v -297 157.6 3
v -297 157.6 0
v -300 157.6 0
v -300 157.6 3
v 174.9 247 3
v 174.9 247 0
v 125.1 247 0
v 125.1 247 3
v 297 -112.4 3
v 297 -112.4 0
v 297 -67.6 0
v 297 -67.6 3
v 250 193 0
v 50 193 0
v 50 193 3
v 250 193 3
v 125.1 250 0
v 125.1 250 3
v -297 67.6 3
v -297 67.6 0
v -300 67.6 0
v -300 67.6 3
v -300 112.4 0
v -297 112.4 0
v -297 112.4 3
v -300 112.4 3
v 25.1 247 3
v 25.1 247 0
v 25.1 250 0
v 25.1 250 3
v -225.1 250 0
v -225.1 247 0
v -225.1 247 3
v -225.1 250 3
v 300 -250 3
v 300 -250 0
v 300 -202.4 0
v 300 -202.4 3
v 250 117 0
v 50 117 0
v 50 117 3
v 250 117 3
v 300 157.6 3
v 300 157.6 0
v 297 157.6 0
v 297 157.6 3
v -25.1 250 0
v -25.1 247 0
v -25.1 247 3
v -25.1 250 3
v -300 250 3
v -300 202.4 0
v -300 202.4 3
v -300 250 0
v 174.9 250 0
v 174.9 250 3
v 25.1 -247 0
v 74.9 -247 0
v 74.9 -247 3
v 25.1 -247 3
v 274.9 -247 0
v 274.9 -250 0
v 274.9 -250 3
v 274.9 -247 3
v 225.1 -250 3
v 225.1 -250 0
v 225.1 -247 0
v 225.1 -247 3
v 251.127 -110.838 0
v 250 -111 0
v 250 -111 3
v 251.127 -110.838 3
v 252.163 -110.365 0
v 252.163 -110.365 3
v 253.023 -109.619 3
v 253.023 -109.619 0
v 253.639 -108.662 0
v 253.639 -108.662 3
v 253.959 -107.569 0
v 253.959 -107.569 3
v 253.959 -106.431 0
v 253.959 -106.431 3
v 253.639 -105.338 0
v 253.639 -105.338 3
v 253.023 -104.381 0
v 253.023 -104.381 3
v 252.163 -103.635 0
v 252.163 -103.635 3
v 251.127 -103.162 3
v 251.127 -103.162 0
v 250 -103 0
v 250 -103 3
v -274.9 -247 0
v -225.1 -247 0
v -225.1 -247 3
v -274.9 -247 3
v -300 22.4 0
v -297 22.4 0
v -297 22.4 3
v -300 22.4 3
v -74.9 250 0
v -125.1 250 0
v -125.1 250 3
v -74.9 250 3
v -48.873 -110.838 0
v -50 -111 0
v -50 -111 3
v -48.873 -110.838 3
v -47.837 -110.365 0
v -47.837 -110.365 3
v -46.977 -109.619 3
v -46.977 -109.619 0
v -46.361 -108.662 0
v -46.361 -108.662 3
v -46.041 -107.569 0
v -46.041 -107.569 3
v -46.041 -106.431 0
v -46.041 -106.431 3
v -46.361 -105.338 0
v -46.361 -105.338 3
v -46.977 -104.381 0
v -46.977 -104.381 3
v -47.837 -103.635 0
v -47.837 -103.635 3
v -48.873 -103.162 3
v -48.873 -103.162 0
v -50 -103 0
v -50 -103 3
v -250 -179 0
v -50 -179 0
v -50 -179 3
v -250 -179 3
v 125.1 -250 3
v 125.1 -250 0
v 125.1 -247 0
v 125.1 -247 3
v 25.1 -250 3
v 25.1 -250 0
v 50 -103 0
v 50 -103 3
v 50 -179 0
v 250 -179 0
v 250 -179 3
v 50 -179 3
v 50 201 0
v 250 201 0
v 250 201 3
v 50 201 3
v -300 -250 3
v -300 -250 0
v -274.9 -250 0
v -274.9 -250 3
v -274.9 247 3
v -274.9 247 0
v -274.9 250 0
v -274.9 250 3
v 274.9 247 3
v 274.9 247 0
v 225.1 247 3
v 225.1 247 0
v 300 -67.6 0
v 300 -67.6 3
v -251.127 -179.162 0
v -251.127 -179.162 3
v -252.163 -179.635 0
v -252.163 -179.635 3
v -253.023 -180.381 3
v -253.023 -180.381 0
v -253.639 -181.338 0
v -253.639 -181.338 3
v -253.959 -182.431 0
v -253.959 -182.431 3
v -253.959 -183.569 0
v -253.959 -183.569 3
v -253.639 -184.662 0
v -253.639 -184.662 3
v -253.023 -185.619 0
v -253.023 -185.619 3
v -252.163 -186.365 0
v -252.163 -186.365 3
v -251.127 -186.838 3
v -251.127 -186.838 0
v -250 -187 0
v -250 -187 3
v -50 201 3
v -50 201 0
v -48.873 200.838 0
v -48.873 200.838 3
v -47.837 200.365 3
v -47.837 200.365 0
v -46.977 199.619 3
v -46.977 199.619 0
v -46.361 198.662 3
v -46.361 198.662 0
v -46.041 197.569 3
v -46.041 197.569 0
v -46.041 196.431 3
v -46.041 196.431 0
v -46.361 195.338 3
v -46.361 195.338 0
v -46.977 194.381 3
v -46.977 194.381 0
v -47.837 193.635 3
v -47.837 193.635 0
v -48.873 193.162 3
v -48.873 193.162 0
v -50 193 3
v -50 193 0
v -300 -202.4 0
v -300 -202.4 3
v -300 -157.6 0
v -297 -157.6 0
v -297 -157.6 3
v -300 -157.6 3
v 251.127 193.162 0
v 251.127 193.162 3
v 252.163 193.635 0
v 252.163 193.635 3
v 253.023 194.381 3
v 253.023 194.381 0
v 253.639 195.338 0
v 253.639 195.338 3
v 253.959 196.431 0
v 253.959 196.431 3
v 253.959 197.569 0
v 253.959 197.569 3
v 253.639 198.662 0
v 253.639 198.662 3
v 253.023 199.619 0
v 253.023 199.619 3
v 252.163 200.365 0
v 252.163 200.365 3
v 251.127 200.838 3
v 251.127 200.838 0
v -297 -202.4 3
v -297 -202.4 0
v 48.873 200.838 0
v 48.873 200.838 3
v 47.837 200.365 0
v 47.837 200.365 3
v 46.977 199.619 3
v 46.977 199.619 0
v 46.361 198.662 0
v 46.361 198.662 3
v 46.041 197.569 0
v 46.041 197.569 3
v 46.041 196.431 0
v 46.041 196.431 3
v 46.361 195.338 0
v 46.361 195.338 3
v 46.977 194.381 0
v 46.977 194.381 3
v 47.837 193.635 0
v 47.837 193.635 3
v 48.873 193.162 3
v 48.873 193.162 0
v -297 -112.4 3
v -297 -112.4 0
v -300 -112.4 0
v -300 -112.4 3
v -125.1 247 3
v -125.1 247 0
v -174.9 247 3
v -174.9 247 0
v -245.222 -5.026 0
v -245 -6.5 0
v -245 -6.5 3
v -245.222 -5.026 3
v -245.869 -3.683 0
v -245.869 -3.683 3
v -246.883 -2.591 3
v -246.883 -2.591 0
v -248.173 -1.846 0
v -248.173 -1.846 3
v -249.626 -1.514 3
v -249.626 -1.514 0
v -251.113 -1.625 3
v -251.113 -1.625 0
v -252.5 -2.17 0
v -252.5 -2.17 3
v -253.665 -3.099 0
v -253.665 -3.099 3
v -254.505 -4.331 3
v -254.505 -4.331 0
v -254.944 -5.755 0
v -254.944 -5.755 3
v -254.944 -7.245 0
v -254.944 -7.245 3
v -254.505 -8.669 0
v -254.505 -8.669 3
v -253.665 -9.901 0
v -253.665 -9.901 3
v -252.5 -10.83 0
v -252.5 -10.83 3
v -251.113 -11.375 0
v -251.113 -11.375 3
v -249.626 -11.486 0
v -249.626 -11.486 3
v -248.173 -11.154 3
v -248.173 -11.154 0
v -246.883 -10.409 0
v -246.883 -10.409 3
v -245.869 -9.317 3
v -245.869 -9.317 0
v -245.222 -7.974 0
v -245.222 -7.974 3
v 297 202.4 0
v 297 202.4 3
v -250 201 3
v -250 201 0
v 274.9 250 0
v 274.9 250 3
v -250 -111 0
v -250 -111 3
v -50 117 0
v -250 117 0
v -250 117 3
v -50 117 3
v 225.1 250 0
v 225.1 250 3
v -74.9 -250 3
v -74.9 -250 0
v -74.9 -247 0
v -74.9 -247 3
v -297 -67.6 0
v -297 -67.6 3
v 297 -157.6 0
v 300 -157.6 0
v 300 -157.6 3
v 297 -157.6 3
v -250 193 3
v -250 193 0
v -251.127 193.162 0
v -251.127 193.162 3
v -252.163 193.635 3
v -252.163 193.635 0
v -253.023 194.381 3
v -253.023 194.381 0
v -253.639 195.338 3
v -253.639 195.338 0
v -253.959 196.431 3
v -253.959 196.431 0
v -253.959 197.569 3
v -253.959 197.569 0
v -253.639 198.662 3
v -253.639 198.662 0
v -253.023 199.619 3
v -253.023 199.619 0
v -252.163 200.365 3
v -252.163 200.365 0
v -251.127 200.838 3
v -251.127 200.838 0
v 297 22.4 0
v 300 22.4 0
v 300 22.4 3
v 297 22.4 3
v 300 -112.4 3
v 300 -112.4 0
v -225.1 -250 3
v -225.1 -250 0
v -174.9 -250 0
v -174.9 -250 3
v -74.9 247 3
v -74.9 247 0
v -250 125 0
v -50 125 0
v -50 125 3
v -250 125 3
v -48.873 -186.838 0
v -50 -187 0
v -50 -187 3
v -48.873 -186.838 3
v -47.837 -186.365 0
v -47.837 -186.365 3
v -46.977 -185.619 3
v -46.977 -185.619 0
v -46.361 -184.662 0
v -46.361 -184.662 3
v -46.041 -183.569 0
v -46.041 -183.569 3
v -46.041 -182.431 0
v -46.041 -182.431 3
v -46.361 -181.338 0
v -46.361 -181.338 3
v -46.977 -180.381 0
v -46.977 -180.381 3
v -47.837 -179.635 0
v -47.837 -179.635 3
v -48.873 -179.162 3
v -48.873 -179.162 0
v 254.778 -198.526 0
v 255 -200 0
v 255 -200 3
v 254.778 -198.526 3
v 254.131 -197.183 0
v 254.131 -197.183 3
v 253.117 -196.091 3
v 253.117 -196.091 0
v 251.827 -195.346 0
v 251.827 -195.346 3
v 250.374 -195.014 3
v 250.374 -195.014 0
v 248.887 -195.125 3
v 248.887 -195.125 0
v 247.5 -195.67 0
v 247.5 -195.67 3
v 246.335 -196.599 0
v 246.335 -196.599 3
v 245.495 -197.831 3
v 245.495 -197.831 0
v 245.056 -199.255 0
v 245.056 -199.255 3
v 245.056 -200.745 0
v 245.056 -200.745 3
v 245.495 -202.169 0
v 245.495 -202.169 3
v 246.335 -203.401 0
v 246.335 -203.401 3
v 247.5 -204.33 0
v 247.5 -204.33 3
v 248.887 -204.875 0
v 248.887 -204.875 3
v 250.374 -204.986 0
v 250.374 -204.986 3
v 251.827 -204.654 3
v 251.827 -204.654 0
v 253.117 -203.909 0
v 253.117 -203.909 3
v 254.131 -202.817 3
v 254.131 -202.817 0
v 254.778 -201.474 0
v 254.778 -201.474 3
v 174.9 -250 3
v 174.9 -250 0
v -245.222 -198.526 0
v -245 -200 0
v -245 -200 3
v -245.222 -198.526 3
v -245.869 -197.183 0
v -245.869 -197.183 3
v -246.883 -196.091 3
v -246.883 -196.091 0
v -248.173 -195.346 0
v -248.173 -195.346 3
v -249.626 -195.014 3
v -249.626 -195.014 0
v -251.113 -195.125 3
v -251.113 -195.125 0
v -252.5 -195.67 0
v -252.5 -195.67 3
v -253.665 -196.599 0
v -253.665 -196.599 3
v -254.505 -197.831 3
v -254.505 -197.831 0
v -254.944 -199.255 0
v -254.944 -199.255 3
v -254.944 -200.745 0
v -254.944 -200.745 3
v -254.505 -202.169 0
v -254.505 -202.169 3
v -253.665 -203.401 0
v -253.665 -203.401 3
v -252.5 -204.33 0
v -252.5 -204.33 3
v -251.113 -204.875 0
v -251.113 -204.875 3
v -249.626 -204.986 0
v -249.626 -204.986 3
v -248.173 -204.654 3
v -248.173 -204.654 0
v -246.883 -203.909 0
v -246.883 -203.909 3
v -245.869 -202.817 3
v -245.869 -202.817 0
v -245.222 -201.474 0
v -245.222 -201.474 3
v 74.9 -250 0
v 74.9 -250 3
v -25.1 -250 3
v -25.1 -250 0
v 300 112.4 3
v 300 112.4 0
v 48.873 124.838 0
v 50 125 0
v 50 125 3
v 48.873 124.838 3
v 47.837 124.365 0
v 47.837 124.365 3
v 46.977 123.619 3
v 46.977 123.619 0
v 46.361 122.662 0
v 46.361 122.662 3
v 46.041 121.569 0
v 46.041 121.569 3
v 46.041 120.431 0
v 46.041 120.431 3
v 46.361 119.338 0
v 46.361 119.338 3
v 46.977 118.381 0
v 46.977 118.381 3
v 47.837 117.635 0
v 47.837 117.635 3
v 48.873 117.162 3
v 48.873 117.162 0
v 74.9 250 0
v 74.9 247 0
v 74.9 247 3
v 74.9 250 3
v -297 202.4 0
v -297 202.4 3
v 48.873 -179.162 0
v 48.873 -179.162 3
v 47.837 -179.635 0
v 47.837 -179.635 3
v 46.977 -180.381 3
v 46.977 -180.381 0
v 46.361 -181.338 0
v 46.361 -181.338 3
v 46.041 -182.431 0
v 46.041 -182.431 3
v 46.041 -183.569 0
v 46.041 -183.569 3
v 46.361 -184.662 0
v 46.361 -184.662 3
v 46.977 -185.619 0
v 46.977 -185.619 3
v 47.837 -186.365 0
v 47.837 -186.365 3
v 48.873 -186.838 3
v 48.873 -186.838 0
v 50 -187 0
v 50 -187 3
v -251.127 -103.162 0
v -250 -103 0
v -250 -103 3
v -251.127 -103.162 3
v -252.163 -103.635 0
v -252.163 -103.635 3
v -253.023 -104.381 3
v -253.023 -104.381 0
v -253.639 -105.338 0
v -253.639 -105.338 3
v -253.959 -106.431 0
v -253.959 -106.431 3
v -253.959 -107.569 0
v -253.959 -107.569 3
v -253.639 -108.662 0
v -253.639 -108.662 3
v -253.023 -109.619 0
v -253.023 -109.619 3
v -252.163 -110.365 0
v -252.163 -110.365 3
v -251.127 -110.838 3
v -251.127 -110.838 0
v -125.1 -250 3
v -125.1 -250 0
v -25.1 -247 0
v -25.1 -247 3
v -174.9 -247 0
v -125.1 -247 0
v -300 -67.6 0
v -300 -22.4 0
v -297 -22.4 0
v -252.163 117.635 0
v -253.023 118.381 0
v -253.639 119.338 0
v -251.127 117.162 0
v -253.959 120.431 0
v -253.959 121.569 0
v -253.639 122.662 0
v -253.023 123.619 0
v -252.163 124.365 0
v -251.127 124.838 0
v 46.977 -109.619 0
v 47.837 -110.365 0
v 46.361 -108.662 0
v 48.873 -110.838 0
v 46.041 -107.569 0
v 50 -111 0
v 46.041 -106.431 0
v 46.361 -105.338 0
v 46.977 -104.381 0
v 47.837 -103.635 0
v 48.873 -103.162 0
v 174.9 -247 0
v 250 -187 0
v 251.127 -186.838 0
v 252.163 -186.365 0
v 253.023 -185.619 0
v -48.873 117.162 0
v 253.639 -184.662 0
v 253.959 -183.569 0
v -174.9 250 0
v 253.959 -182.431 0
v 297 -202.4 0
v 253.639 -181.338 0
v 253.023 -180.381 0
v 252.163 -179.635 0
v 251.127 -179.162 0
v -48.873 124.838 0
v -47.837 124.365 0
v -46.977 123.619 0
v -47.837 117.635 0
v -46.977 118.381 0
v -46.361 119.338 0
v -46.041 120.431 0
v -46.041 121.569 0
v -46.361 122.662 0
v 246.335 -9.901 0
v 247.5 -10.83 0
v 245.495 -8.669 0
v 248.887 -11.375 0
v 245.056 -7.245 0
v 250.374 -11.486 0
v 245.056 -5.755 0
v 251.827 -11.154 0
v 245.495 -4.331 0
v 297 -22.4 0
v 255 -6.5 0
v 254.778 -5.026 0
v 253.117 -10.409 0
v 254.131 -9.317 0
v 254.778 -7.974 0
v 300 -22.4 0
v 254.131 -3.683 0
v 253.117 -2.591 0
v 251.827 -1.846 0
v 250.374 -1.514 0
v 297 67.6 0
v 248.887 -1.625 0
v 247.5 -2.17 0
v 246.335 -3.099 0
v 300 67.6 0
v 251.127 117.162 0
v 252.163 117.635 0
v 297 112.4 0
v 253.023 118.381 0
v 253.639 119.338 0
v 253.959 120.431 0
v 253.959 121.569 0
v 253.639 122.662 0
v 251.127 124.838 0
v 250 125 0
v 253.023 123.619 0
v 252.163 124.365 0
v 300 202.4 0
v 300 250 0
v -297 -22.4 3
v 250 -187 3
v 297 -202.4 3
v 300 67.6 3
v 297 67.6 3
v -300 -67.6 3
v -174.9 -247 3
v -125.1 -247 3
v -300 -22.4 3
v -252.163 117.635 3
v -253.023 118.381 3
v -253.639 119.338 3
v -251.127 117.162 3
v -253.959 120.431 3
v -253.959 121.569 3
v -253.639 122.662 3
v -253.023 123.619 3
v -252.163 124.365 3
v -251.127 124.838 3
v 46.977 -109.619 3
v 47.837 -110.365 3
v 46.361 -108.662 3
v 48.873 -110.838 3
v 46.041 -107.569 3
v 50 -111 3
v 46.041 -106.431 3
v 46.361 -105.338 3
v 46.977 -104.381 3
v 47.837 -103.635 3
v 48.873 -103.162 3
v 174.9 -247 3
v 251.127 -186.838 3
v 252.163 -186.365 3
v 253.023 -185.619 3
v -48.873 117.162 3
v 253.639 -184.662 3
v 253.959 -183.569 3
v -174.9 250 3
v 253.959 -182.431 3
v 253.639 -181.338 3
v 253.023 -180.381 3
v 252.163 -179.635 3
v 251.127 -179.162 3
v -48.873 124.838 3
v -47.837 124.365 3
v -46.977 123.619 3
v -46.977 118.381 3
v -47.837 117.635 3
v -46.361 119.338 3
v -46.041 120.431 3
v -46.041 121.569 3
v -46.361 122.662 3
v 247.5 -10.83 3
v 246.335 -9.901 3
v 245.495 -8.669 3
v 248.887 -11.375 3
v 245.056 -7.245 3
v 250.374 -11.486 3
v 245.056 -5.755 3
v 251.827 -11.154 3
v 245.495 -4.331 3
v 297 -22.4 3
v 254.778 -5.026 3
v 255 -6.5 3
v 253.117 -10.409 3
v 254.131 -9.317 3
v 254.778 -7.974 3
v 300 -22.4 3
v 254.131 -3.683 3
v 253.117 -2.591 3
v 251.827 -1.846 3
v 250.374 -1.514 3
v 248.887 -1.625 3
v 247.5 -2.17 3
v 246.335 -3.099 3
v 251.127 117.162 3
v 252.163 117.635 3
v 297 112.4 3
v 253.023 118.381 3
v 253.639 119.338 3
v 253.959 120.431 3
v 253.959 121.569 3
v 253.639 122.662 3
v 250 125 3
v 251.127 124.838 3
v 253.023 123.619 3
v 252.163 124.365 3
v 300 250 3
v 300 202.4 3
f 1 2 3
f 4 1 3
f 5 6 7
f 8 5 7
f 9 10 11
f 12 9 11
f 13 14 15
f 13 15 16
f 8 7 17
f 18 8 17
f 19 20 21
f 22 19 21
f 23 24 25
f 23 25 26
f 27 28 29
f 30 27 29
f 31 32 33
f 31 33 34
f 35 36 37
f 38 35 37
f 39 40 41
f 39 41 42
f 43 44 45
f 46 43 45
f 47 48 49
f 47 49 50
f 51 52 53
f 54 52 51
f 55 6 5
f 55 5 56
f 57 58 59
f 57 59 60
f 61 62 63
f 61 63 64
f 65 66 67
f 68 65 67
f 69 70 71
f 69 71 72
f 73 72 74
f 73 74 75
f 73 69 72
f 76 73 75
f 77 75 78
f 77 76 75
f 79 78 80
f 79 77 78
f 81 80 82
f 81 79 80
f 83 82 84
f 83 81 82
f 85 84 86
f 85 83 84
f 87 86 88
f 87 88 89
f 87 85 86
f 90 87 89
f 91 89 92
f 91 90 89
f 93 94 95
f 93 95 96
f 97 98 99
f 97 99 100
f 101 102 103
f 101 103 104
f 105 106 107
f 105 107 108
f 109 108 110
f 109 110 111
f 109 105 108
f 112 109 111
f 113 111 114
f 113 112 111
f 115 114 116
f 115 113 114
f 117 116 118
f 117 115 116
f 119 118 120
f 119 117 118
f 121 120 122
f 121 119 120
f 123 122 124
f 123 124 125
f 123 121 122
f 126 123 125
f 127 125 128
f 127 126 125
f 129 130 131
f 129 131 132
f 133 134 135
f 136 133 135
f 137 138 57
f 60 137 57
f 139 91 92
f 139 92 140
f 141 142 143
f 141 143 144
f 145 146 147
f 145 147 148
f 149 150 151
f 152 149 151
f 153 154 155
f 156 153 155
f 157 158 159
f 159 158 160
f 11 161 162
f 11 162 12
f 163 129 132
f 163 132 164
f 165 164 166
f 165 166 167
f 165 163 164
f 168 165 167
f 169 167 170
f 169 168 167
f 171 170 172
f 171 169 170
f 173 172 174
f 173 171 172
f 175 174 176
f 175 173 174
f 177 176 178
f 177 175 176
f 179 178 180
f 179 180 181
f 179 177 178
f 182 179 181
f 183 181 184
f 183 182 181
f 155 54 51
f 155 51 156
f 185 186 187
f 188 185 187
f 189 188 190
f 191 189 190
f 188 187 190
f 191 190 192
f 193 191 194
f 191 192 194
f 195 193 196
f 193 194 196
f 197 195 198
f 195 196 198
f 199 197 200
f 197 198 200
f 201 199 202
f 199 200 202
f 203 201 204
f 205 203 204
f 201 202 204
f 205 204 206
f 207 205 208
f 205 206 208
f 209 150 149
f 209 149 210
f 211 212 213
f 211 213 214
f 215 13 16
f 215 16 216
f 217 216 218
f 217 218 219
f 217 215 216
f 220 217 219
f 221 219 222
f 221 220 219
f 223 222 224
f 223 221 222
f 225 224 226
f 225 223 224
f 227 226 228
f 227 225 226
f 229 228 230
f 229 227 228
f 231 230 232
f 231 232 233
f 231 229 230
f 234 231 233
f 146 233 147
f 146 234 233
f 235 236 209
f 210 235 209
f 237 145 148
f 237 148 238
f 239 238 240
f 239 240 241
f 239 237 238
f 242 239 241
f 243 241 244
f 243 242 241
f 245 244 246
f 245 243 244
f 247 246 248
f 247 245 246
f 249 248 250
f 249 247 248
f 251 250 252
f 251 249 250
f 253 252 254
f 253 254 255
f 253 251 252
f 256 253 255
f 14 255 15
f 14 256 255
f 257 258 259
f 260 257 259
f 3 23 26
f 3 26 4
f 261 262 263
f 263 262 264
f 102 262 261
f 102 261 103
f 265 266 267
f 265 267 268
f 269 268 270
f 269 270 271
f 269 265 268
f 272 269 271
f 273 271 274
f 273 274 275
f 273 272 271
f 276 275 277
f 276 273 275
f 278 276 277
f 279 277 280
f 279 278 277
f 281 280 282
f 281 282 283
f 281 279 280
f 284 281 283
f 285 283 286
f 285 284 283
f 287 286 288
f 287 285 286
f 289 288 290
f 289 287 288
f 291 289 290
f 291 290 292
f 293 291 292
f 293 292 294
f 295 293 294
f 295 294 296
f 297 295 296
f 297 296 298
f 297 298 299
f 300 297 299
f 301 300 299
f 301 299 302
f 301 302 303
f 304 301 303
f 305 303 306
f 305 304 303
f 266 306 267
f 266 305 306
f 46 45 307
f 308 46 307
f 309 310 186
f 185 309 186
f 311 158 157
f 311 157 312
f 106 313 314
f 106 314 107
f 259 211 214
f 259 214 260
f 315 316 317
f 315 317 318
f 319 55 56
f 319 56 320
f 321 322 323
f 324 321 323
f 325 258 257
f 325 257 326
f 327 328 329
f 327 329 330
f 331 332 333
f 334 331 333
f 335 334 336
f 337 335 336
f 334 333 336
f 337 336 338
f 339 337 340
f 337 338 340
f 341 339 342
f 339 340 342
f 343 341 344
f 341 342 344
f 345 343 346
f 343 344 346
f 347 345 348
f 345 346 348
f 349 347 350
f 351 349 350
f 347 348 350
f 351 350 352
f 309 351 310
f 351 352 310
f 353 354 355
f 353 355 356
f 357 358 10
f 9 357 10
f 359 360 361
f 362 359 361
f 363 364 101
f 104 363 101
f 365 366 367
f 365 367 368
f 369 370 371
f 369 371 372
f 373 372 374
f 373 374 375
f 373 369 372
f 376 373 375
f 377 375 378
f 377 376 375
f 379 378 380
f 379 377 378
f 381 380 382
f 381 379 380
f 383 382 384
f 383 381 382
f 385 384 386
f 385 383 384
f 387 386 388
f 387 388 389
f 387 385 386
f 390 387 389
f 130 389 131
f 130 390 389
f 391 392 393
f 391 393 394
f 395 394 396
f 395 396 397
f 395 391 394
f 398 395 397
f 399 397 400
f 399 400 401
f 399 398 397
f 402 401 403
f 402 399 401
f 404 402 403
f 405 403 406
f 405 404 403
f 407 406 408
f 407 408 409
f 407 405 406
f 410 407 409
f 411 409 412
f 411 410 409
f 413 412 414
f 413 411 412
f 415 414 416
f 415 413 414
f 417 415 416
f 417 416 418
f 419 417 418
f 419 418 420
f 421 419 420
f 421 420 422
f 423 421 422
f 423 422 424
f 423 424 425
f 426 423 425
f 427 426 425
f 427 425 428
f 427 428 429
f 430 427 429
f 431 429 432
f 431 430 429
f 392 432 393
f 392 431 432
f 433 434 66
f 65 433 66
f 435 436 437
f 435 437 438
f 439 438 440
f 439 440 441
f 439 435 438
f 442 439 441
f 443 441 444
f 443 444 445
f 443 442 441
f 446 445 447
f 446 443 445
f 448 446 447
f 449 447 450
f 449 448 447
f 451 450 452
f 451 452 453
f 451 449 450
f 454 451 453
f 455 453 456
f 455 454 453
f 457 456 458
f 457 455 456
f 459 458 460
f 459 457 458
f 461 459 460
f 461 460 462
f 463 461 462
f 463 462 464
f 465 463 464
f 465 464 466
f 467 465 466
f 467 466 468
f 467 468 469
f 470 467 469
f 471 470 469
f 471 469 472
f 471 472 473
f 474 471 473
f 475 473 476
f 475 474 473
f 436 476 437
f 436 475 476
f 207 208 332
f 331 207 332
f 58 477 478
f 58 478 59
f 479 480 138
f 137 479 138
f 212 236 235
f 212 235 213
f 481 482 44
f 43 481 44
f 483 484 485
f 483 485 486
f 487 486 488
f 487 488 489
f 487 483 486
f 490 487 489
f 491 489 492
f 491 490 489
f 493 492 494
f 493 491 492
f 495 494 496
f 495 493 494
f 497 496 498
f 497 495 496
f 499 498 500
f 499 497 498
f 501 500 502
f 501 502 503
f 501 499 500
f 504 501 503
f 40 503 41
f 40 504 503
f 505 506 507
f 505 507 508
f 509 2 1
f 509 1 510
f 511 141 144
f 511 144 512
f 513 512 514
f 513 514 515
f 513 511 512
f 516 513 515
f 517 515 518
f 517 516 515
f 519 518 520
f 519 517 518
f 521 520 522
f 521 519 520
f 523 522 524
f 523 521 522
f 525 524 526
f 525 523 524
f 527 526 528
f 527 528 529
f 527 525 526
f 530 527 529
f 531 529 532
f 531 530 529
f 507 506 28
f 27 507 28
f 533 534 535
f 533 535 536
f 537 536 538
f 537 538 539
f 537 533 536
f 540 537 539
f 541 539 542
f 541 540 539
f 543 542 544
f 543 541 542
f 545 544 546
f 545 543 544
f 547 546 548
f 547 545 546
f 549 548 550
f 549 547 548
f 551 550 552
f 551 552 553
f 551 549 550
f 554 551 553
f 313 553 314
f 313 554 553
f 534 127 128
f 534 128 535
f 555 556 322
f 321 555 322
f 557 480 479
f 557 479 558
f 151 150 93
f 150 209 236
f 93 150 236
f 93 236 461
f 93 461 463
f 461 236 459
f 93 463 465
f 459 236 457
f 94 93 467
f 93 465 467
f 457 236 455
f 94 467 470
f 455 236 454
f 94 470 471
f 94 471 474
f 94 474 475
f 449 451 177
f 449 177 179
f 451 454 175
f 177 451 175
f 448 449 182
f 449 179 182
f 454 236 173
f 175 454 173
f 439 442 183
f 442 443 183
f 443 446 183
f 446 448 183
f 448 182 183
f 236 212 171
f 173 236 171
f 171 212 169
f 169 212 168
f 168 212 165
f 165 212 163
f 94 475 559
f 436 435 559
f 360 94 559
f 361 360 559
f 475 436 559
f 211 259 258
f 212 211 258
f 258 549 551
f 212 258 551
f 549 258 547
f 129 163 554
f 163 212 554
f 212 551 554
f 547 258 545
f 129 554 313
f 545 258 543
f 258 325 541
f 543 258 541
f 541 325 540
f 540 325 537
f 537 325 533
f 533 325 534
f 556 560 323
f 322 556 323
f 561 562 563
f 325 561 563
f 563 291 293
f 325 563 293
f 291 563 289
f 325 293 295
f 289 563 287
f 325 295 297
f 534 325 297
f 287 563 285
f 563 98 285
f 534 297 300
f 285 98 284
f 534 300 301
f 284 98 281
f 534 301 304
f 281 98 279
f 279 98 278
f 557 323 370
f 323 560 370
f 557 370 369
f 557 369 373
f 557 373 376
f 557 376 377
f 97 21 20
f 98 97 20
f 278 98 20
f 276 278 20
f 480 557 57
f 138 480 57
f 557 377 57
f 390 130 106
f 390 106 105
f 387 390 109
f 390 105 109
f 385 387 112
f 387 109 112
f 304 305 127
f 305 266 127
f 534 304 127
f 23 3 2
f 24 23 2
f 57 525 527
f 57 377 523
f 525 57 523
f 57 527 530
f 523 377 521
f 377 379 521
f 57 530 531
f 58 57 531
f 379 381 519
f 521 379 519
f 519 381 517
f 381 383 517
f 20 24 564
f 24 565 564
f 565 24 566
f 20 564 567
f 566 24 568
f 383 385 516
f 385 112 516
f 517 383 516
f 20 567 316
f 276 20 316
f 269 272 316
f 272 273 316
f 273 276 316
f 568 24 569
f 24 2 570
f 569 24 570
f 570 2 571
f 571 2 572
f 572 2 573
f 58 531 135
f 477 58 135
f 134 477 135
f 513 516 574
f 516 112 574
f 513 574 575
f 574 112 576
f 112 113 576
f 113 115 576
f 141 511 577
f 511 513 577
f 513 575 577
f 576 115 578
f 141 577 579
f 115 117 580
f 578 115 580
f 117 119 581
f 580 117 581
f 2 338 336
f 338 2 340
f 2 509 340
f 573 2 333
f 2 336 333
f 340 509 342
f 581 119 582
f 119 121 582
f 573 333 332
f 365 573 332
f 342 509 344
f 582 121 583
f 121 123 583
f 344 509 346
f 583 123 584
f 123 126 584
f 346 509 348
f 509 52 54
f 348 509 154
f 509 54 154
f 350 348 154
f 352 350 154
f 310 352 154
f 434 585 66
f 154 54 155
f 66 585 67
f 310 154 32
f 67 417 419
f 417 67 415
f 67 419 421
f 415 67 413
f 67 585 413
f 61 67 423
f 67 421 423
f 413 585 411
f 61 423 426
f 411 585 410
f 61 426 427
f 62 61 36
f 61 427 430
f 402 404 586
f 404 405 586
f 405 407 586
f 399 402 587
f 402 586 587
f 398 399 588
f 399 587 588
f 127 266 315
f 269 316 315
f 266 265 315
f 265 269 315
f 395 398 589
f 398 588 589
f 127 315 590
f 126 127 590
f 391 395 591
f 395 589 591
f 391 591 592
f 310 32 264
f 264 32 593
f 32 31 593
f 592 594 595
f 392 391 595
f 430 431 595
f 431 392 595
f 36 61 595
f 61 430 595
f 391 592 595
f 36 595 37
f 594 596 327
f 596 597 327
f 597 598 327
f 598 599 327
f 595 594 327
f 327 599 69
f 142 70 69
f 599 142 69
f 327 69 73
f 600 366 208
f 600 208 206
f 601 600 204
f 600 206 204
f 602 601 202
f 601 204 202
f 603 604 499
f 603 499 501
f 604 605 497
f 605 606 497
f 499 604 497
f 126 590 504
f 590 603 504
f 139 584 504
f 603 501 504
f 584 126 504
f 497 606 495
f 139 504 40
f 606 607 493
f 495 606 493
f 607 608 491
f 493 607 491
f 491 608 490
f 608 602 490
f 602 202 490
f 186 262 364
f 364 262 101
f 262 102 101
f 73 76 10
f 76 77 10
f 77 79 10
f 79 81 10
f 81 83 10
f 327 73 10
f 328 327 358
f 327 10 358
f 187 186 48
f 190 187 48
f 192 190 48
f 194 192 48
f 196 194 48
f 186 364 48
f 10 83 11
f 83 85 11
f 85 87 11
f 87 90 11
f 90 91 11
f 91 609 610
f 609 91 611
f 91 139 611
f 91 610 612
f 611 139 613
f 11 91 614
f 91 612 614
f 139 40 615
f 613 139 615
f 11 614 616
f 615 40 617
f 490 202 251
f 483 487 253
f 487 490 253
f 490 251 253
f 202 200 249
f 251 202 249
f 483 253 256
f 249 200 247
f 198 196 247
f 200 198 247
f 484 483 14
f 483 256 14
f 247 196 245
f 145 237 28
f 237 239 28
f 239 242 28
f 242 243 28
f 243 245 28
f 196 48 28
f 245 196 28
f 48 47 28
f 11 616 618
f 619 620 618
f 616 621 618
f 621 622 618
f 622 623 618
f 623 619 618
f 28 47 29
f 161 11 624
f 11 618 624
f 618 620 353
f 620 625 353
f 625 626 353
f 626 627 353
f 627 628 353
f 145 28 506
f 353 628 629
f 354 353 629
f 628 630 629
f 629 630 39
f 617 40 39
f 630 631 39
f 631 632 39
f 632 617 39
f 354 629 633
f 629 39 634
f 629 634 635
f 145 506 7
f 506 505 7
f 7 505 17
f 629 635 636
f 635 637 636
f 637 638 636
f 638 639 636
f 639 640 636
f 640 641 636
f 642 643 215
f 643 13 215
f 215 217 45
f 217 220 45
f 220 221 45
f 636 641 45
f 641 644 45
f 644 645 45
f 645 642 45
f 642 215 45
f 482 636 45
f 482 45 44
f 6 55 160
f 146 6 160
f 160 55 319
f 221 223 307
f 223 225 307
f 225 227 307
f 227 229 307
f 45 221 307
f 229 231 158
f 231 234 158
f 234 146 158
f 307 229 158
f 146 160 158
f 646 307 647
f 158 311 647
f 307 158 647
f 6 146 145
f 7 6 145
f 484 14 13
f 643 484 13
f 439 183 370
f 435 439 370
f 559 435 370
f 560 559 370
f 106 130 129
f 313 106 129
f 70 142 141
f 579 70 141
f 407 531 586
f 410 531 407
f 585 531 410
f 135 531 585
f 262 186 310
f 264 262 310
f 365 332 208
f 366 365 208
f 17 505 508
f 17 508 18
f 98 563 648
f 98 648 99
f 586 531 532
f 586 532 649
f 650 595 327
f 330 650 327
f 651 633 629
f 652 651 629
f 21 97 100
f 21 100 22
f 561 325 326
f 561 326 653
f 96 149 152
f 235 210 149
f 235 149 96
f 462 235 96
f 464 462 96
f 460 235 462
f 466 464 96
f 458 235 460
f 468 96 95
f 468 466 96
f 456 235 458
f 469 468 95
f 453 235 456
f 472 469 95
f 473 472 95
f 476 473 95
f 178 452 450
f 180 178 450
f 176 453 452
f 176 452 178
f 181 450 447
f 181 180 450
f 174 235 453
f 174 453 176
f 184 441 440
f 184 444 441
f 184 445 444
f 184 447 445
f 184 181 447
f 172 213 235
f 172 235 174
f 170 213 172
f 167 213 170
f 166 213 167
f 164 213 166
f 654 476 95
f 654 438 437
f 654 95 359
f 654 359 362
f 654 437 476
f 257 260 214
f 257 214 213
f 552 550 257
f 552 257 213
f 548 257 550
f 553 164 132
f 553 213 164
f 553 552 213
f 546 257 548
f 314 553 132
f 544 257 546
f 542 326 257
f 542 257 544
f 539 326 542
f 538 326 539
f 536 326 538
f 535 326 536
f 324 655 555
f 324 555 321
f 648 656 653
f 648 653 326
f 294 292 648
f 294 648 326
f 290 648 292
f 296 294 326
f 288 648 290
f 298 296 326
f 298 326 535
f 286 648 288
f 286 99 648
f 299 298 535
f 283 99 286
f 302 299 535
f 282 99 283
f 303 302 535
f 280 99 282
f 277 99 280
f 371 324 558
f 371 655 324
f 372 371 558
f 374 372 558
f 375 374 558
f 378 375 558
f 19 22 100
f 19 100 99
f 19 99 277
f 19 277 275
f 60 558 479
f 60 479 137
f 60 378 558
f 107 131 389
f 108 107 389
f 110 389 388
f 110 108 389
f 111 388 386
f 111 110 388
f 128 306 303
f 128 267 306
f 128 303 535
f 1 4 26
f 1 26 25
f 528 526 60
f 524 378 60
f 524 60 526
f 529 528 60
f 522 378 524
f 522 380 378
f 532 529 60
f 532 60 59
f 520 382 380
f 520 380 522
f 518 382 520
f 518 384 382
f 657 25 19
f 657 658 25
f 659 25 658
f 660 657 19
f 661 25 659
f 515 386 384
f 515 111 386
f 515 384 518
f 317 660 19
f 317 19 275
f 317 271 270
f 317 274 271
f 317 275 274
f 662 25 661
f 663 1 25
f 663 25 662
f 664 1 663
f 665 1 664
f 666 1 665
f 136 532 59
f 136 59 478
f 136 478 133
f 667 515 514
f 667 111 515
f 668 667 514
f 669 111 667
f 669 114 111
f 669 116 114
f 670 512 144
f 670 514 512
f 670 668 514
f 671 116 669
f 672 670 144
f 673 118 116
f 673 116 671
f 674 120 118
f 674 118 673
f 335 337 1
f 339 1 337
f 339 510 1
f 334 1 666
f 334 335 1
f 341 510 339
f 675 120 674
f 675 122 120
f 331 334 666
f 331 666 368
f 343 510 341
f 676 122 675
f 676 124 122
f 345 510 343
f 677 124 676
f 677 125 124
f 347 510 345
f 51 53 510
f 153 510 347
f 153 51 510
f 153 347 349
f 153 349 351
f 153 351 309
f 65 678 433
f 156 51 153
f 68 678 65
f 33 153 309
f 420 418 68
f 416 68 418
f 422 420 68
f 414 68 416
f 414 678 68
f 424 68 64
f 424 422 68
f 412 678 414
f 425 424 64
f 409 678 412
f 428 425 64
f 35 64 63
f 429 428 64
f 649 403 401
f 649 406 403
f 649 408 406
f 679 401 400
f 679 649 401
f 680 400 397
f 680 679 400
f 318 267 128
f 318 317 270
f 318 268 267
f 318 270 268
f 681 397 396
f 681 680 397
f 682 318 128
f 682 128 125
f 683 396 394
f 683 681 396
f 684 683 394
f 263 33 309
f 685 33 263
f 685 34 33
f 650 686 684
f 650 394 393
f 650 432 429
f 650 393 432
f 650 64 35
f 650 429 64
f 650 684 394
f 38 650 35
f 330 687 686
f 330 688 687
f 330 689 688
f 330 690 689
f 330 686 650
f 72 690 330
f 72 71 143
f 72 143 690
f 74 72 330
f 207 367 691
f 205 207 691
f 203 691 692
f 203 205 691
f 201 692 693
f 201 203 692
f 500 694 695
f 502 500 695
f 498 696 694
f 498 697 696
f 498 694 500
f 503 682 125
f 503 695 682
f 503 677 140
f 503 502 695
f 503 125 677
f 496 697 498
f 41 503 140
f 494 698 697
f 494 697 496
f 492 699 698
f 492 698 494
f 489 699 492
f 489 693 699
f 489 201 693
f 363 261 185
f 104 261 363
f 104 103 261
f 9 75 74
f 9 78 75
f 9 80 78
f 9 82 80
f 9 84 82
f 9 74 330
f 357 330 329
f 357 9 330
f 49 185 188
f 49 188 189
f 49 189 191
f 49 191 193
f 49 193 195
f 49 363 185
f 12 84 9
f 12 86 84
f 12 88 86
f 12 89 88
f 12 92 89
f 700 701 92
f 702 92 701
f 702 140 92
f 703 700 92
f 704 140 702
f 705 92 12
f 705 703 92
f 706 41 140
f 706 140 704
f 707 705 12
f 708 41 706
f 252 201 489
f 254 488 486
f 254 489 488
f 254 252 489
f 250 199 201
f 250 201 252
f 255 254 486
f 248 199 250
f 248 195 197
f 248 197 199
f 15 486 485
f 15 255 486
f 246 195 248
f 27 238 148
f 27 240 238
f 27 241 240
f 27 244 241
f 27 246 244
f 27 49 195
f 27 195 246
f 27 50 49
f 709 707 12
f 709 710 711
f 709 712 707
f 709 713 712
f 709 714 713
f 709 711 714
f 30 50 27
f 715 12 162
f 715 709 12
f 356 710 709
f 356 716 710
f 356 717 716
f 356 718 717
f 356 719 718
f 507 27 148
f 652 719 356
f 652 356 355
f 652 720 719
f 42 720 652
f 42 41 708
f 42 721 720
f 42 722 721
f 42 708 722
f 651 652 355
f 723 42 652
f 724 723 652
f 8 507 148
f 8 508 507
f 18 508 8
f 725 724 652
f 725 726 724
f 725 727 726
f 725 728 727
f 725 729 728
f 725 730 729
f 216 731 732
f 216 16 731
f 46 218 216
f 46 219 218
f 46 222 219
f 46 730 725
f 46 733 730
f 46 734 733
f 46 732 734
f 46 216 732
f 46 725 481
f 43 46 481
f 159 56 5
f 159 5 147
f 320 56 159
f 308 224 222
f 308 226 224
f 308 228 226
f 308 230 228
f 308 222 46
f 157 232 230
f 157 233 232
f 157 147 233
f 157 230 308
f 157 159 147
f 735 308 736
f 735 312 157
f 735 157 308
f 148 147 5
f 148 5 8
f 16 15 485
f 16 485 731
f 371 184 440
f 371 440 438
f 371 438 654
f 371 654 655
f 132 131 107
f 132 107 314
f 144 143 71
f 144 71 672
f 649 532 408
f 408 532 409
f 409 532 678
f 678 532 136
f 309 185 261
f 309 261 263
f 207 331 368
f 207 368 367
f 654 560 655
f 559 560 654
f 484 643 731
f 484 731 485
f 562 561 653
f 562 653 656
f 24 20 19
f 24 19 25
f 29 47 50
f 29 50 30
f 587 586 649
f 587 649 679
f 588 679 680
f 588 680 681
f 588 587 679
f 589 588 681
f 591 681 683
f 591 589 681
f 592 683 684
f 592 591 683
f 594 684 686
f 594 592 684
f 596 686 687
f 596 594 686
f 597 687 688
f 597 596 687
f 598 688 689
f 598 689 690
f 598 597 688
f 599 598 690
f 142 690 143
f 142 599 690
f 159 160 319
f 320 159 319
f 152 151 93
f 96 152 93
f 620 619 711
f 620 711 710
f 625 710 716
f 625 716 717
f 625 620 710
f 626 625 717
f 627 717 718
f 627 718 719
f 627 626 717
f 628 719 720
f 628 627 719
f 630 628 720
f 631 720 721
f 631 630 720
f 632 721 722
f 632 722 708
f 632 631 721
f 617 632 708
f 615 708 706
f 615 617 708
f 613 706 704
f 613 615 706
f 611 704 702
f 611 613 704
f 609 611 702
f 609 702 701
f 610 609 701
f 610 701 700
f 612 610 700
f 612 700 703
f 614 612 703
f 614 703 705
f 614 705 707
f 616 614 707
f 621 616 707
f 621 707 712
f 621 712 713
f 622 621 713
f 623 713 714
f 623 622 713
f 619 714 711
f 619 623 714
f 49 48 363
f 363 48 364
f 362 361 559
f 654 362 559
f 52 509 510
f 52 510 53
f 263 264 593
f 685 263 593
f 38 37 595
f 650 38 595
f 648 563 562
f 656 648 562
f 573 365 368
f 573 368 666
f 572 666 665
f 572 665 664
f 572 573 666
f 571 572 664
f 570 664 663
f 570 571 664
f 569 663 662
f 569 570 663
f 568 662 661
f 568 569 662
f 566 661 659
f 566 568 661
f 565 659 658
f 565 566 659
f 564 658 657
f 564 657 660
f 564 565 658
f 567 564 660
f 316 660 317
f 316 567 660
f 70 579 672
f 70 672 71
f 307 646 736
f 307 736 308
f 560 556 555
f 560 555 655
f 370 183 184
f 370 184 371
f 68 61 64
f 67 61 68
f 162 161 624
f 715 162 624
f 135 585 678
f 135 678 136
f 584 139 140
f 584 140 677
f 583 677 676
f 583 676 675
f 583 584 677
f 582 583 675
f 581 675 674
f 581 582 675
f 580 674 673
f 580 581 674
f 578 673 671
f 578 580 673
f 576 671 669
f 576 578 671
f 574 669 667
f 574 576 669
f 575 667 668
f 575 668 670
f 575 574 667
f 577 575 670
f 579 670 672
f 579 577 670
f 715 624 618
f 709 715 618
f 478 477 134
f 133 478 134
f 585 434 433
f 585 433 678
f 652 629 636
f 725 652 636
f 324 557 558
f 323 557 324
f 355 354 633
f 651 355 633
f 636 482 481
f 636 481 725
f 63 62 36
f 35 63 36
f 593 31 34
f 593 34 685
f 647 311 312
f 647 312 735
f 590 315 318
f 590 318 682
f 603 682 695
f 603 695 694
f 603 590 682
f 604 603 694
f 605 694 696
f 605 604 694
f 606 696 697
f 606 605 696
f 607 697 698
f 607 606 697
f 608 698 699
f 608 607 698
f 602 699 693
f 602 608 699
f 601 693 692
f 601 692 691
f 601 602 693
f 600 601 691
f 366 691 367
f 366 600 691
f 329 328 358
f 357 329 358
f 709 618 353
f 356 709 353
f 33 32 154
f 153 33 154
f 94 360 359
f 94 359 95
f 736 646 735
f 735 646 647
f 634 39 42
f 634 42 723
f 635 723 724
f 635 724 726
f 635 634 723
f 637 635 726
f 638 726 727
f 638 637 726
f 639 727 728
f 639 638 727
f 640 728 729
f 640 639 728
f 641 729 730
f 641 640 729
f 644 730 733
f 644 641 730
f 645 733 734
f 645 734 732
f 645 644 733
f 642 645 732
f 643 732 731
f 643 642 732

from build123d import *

# Parameters (mm, degrees)
CROQUIS1_W              = 600
CROQUIS1_H              = 500
CROQUIS1_R              = 5
SALIENTE_EXTRUIR1_DEPTH = 3
CROQUIS5_W              = 49.8
CROQUIS5_H              = 3
CROQUIS5_W_2            = 3
CROQUIS5_H_2            = 44.8
CORTAR_EXTRUIR2_DEPTH   = 4


with BuildPart() as part:
    # Croquis1 → Saliente-Extruir1 (new body)
    with BuildSketch(Plane.XY):
        Rectangle(CROQUIS1_W, CROQUIS1_H)
        with Locations((-250, -200)):
            Circle(CROQUIS1_R, mode=Mode.SUBTRACT)
        with Locations((-250, -6.5)):
            Circle(CROQUIS1_R, mode=Mode.SUBTRACT)
        with Locations((250, -200)):
            Circle(CROQUIS1_R, mode=Mode.SUBTRACT)
        with Locations((250, -6.5)):
            Circle(CROQUIS1_R, mode=Mode.SUBTRACT)
        with BuildLine():
            Line((-250, 201), (-50, 201))
            ThreePointArc((-50, 201), (-46, 197), (-50, 193))
            Line((-50, 193), (-250, 193))
            ThreePointArc((-250, 193), (-254, 197), (-250, 201))
        make_face(mode=Mode.SUBTRACT)
        with BuildLine():
            Line((-250, 117), (-50, 117))
            ThreePointArc((-50, 117), (-46, 121), (-50, 125))
            Line((-50, 125), (-250, 125))
            ThreePointArc((-250, 125), (-254, 121), (-250, 117))
        make_face(mode=Mode.SUBTRACT)
        with BuildLine():
            Line((-250, -111), (-50, -111))
            ThreePointArc((-50, -111), (-46, -107), (-50, -103))
            Line((-50, -103), (-250, -103))
            ThreePointArc((-250, -103), (-254, -107), (-250, -111))
        make_face(mode=Mode.SUBTRACT)
        with BuildLine():
            Line((-250, -187), (-50, -187))
            ThreePointArc((-50, -187), (-46, -183), (-50, -179))
            Line((-50, -179), (-250, -179))
            ThreePointArc((-250, -179), (-254, -183), (-250, -187))
        make_face(mode=Mode.SUBTRACT)
        with BuildLine():
            Line((250, -103), (50, -103))
            ThreePointArc((50, -103), (46, -107), (50, -111))
            Line((50, -111), (250, -111))
            ThreePointArc((250, -111), (254, -107), (250, -103))
        make_face(mode=Mode.SUBTRACT)
        with BuildLine():
            Line((250, -179), (50, -179))
            ThreePointArc((50, -179), (46, -183), (50, -187))
            Line((50, -187), (250, -187))
            ThreePointArc((250, -187), (254, -183), (250, -179))
        make_face(mode=Mode.SUBTRACT)
        with BuildLine():
            Line((250, 201), (50, 201))
            ThreePointArc((50, 201), (46, 197), (50, 193))
            Line((50, 193), (250, 193))
            ThreePointArc((250, 193), (254, 197), (250, 201))
        make_face(mode=Mode.SUBTRACT)
        with BuildLine():
            Line((250, 125), (50, 125))
            ThreePointArc((50, 125), (46, 121), (50, 117))
            Line((50, 117), (250, 117))
            ThreePointArc((250, 117), (254, 121), (250, 125))
        make_face(mode=Mode.SUBTRACT)
    extrude(amount=SALIENTE_EXTRUIR1_DEPTH)

    # Croquis5 → Cortar-Extruir2 (cut, through all)
    with BuildSketch(Plane(origin=(0, 0, 0), x_dir=(-1, 0, 0), z_dir=(0, 0, -1))):
        with Locations((150, 248.5)):
            Rectangle(CROQUIS5_W, CROQUIS5_H)
        with Locations((50, 248.5)):
            Rectangle(CROQUIS5_W, CROQUIS5_H)
        with Locations((250, 248.5)):
            Rectangle(CROQUIS5_W, CROQUIS5_H)
        with Locations((-50, 248.5)):
            Rectangle(CROQUIS5_W, CROQUIS5_H)
        with Locations((-150, 248.5)):
            Rectangle(CROQUIS5_W, CROQUIS5_H)
        with Locations((298.5, 180)):
            Rectangle(CROQUIS5_W_2, CROQUIS5_H_2)
        with Locations((-250, 248.5)):
            Rectangle(CROQUIS5_W, CROQUIS5_H)
        with Locations((298.5, 90)):
            Rectangle(CROQUIS5_W_2, CROQUIS5_H_2)
        with Locations((298.5, 0)):
            Rectangle(CROQUIS5_W_2, CROQUIS5_H_2)
        with Locations((298.5, -90)):
            Rectangle(CROQUIS5_W_2, CROQUIS5_H_2)
        with Locations((298.5, -180)):
            Rectangle(CROQUIS5_W_2, CROQUIS5_H_2)
        with Locations((-250, -248.5)):
            Rectangle(CROQUIS5_W, CROQUIS5_H)
        with Locations((-150, -248.5)):
            Rectangle(CROQUIS5_W, CROQUIS5_H)
        with Locations((-50, -248.5)):
            Rectangle(CROQUIS5_W, CROQUIS5_H)
        with Locations((50, -248.5)):
            Rectangle(CROQUIS5_W, CROQUIS5_H)
        with Locations((250, -248.5)):
            Rectangle(CROQUIS5_W, CROQUIS5_H)
        with Locations((150, -248.5)):
            Rectangle(CROQUIS5_W, CROQUIS5_H)
        with Locations((-298.5, -180)):
            Rectangle(CROQUIS5_W_2, CROQUIS5_H_2)
        with Locations((-298.5, -90)):
            Rectangle(CROQUIS5_W_2, CROQUIS5_H_2)
        with Locations((-298.5, 0)):
            Rectangle(CROQUIS5_W_2, CROQUIS5_H_2)
        with Locations((-298.5, 90)):
            Rectangle(CROQUIS5_W_2, CROQUIS5_H_2)
        with Locations((-298.5, 180)):
            Rectangle(CROQUIS5_W_2, CROQUIS5_H_2)
    extrude(amount=-CORTAR_EXTRUIR2_DEPTH, mode=Mode.SUBTRACT)


solid = part.part
